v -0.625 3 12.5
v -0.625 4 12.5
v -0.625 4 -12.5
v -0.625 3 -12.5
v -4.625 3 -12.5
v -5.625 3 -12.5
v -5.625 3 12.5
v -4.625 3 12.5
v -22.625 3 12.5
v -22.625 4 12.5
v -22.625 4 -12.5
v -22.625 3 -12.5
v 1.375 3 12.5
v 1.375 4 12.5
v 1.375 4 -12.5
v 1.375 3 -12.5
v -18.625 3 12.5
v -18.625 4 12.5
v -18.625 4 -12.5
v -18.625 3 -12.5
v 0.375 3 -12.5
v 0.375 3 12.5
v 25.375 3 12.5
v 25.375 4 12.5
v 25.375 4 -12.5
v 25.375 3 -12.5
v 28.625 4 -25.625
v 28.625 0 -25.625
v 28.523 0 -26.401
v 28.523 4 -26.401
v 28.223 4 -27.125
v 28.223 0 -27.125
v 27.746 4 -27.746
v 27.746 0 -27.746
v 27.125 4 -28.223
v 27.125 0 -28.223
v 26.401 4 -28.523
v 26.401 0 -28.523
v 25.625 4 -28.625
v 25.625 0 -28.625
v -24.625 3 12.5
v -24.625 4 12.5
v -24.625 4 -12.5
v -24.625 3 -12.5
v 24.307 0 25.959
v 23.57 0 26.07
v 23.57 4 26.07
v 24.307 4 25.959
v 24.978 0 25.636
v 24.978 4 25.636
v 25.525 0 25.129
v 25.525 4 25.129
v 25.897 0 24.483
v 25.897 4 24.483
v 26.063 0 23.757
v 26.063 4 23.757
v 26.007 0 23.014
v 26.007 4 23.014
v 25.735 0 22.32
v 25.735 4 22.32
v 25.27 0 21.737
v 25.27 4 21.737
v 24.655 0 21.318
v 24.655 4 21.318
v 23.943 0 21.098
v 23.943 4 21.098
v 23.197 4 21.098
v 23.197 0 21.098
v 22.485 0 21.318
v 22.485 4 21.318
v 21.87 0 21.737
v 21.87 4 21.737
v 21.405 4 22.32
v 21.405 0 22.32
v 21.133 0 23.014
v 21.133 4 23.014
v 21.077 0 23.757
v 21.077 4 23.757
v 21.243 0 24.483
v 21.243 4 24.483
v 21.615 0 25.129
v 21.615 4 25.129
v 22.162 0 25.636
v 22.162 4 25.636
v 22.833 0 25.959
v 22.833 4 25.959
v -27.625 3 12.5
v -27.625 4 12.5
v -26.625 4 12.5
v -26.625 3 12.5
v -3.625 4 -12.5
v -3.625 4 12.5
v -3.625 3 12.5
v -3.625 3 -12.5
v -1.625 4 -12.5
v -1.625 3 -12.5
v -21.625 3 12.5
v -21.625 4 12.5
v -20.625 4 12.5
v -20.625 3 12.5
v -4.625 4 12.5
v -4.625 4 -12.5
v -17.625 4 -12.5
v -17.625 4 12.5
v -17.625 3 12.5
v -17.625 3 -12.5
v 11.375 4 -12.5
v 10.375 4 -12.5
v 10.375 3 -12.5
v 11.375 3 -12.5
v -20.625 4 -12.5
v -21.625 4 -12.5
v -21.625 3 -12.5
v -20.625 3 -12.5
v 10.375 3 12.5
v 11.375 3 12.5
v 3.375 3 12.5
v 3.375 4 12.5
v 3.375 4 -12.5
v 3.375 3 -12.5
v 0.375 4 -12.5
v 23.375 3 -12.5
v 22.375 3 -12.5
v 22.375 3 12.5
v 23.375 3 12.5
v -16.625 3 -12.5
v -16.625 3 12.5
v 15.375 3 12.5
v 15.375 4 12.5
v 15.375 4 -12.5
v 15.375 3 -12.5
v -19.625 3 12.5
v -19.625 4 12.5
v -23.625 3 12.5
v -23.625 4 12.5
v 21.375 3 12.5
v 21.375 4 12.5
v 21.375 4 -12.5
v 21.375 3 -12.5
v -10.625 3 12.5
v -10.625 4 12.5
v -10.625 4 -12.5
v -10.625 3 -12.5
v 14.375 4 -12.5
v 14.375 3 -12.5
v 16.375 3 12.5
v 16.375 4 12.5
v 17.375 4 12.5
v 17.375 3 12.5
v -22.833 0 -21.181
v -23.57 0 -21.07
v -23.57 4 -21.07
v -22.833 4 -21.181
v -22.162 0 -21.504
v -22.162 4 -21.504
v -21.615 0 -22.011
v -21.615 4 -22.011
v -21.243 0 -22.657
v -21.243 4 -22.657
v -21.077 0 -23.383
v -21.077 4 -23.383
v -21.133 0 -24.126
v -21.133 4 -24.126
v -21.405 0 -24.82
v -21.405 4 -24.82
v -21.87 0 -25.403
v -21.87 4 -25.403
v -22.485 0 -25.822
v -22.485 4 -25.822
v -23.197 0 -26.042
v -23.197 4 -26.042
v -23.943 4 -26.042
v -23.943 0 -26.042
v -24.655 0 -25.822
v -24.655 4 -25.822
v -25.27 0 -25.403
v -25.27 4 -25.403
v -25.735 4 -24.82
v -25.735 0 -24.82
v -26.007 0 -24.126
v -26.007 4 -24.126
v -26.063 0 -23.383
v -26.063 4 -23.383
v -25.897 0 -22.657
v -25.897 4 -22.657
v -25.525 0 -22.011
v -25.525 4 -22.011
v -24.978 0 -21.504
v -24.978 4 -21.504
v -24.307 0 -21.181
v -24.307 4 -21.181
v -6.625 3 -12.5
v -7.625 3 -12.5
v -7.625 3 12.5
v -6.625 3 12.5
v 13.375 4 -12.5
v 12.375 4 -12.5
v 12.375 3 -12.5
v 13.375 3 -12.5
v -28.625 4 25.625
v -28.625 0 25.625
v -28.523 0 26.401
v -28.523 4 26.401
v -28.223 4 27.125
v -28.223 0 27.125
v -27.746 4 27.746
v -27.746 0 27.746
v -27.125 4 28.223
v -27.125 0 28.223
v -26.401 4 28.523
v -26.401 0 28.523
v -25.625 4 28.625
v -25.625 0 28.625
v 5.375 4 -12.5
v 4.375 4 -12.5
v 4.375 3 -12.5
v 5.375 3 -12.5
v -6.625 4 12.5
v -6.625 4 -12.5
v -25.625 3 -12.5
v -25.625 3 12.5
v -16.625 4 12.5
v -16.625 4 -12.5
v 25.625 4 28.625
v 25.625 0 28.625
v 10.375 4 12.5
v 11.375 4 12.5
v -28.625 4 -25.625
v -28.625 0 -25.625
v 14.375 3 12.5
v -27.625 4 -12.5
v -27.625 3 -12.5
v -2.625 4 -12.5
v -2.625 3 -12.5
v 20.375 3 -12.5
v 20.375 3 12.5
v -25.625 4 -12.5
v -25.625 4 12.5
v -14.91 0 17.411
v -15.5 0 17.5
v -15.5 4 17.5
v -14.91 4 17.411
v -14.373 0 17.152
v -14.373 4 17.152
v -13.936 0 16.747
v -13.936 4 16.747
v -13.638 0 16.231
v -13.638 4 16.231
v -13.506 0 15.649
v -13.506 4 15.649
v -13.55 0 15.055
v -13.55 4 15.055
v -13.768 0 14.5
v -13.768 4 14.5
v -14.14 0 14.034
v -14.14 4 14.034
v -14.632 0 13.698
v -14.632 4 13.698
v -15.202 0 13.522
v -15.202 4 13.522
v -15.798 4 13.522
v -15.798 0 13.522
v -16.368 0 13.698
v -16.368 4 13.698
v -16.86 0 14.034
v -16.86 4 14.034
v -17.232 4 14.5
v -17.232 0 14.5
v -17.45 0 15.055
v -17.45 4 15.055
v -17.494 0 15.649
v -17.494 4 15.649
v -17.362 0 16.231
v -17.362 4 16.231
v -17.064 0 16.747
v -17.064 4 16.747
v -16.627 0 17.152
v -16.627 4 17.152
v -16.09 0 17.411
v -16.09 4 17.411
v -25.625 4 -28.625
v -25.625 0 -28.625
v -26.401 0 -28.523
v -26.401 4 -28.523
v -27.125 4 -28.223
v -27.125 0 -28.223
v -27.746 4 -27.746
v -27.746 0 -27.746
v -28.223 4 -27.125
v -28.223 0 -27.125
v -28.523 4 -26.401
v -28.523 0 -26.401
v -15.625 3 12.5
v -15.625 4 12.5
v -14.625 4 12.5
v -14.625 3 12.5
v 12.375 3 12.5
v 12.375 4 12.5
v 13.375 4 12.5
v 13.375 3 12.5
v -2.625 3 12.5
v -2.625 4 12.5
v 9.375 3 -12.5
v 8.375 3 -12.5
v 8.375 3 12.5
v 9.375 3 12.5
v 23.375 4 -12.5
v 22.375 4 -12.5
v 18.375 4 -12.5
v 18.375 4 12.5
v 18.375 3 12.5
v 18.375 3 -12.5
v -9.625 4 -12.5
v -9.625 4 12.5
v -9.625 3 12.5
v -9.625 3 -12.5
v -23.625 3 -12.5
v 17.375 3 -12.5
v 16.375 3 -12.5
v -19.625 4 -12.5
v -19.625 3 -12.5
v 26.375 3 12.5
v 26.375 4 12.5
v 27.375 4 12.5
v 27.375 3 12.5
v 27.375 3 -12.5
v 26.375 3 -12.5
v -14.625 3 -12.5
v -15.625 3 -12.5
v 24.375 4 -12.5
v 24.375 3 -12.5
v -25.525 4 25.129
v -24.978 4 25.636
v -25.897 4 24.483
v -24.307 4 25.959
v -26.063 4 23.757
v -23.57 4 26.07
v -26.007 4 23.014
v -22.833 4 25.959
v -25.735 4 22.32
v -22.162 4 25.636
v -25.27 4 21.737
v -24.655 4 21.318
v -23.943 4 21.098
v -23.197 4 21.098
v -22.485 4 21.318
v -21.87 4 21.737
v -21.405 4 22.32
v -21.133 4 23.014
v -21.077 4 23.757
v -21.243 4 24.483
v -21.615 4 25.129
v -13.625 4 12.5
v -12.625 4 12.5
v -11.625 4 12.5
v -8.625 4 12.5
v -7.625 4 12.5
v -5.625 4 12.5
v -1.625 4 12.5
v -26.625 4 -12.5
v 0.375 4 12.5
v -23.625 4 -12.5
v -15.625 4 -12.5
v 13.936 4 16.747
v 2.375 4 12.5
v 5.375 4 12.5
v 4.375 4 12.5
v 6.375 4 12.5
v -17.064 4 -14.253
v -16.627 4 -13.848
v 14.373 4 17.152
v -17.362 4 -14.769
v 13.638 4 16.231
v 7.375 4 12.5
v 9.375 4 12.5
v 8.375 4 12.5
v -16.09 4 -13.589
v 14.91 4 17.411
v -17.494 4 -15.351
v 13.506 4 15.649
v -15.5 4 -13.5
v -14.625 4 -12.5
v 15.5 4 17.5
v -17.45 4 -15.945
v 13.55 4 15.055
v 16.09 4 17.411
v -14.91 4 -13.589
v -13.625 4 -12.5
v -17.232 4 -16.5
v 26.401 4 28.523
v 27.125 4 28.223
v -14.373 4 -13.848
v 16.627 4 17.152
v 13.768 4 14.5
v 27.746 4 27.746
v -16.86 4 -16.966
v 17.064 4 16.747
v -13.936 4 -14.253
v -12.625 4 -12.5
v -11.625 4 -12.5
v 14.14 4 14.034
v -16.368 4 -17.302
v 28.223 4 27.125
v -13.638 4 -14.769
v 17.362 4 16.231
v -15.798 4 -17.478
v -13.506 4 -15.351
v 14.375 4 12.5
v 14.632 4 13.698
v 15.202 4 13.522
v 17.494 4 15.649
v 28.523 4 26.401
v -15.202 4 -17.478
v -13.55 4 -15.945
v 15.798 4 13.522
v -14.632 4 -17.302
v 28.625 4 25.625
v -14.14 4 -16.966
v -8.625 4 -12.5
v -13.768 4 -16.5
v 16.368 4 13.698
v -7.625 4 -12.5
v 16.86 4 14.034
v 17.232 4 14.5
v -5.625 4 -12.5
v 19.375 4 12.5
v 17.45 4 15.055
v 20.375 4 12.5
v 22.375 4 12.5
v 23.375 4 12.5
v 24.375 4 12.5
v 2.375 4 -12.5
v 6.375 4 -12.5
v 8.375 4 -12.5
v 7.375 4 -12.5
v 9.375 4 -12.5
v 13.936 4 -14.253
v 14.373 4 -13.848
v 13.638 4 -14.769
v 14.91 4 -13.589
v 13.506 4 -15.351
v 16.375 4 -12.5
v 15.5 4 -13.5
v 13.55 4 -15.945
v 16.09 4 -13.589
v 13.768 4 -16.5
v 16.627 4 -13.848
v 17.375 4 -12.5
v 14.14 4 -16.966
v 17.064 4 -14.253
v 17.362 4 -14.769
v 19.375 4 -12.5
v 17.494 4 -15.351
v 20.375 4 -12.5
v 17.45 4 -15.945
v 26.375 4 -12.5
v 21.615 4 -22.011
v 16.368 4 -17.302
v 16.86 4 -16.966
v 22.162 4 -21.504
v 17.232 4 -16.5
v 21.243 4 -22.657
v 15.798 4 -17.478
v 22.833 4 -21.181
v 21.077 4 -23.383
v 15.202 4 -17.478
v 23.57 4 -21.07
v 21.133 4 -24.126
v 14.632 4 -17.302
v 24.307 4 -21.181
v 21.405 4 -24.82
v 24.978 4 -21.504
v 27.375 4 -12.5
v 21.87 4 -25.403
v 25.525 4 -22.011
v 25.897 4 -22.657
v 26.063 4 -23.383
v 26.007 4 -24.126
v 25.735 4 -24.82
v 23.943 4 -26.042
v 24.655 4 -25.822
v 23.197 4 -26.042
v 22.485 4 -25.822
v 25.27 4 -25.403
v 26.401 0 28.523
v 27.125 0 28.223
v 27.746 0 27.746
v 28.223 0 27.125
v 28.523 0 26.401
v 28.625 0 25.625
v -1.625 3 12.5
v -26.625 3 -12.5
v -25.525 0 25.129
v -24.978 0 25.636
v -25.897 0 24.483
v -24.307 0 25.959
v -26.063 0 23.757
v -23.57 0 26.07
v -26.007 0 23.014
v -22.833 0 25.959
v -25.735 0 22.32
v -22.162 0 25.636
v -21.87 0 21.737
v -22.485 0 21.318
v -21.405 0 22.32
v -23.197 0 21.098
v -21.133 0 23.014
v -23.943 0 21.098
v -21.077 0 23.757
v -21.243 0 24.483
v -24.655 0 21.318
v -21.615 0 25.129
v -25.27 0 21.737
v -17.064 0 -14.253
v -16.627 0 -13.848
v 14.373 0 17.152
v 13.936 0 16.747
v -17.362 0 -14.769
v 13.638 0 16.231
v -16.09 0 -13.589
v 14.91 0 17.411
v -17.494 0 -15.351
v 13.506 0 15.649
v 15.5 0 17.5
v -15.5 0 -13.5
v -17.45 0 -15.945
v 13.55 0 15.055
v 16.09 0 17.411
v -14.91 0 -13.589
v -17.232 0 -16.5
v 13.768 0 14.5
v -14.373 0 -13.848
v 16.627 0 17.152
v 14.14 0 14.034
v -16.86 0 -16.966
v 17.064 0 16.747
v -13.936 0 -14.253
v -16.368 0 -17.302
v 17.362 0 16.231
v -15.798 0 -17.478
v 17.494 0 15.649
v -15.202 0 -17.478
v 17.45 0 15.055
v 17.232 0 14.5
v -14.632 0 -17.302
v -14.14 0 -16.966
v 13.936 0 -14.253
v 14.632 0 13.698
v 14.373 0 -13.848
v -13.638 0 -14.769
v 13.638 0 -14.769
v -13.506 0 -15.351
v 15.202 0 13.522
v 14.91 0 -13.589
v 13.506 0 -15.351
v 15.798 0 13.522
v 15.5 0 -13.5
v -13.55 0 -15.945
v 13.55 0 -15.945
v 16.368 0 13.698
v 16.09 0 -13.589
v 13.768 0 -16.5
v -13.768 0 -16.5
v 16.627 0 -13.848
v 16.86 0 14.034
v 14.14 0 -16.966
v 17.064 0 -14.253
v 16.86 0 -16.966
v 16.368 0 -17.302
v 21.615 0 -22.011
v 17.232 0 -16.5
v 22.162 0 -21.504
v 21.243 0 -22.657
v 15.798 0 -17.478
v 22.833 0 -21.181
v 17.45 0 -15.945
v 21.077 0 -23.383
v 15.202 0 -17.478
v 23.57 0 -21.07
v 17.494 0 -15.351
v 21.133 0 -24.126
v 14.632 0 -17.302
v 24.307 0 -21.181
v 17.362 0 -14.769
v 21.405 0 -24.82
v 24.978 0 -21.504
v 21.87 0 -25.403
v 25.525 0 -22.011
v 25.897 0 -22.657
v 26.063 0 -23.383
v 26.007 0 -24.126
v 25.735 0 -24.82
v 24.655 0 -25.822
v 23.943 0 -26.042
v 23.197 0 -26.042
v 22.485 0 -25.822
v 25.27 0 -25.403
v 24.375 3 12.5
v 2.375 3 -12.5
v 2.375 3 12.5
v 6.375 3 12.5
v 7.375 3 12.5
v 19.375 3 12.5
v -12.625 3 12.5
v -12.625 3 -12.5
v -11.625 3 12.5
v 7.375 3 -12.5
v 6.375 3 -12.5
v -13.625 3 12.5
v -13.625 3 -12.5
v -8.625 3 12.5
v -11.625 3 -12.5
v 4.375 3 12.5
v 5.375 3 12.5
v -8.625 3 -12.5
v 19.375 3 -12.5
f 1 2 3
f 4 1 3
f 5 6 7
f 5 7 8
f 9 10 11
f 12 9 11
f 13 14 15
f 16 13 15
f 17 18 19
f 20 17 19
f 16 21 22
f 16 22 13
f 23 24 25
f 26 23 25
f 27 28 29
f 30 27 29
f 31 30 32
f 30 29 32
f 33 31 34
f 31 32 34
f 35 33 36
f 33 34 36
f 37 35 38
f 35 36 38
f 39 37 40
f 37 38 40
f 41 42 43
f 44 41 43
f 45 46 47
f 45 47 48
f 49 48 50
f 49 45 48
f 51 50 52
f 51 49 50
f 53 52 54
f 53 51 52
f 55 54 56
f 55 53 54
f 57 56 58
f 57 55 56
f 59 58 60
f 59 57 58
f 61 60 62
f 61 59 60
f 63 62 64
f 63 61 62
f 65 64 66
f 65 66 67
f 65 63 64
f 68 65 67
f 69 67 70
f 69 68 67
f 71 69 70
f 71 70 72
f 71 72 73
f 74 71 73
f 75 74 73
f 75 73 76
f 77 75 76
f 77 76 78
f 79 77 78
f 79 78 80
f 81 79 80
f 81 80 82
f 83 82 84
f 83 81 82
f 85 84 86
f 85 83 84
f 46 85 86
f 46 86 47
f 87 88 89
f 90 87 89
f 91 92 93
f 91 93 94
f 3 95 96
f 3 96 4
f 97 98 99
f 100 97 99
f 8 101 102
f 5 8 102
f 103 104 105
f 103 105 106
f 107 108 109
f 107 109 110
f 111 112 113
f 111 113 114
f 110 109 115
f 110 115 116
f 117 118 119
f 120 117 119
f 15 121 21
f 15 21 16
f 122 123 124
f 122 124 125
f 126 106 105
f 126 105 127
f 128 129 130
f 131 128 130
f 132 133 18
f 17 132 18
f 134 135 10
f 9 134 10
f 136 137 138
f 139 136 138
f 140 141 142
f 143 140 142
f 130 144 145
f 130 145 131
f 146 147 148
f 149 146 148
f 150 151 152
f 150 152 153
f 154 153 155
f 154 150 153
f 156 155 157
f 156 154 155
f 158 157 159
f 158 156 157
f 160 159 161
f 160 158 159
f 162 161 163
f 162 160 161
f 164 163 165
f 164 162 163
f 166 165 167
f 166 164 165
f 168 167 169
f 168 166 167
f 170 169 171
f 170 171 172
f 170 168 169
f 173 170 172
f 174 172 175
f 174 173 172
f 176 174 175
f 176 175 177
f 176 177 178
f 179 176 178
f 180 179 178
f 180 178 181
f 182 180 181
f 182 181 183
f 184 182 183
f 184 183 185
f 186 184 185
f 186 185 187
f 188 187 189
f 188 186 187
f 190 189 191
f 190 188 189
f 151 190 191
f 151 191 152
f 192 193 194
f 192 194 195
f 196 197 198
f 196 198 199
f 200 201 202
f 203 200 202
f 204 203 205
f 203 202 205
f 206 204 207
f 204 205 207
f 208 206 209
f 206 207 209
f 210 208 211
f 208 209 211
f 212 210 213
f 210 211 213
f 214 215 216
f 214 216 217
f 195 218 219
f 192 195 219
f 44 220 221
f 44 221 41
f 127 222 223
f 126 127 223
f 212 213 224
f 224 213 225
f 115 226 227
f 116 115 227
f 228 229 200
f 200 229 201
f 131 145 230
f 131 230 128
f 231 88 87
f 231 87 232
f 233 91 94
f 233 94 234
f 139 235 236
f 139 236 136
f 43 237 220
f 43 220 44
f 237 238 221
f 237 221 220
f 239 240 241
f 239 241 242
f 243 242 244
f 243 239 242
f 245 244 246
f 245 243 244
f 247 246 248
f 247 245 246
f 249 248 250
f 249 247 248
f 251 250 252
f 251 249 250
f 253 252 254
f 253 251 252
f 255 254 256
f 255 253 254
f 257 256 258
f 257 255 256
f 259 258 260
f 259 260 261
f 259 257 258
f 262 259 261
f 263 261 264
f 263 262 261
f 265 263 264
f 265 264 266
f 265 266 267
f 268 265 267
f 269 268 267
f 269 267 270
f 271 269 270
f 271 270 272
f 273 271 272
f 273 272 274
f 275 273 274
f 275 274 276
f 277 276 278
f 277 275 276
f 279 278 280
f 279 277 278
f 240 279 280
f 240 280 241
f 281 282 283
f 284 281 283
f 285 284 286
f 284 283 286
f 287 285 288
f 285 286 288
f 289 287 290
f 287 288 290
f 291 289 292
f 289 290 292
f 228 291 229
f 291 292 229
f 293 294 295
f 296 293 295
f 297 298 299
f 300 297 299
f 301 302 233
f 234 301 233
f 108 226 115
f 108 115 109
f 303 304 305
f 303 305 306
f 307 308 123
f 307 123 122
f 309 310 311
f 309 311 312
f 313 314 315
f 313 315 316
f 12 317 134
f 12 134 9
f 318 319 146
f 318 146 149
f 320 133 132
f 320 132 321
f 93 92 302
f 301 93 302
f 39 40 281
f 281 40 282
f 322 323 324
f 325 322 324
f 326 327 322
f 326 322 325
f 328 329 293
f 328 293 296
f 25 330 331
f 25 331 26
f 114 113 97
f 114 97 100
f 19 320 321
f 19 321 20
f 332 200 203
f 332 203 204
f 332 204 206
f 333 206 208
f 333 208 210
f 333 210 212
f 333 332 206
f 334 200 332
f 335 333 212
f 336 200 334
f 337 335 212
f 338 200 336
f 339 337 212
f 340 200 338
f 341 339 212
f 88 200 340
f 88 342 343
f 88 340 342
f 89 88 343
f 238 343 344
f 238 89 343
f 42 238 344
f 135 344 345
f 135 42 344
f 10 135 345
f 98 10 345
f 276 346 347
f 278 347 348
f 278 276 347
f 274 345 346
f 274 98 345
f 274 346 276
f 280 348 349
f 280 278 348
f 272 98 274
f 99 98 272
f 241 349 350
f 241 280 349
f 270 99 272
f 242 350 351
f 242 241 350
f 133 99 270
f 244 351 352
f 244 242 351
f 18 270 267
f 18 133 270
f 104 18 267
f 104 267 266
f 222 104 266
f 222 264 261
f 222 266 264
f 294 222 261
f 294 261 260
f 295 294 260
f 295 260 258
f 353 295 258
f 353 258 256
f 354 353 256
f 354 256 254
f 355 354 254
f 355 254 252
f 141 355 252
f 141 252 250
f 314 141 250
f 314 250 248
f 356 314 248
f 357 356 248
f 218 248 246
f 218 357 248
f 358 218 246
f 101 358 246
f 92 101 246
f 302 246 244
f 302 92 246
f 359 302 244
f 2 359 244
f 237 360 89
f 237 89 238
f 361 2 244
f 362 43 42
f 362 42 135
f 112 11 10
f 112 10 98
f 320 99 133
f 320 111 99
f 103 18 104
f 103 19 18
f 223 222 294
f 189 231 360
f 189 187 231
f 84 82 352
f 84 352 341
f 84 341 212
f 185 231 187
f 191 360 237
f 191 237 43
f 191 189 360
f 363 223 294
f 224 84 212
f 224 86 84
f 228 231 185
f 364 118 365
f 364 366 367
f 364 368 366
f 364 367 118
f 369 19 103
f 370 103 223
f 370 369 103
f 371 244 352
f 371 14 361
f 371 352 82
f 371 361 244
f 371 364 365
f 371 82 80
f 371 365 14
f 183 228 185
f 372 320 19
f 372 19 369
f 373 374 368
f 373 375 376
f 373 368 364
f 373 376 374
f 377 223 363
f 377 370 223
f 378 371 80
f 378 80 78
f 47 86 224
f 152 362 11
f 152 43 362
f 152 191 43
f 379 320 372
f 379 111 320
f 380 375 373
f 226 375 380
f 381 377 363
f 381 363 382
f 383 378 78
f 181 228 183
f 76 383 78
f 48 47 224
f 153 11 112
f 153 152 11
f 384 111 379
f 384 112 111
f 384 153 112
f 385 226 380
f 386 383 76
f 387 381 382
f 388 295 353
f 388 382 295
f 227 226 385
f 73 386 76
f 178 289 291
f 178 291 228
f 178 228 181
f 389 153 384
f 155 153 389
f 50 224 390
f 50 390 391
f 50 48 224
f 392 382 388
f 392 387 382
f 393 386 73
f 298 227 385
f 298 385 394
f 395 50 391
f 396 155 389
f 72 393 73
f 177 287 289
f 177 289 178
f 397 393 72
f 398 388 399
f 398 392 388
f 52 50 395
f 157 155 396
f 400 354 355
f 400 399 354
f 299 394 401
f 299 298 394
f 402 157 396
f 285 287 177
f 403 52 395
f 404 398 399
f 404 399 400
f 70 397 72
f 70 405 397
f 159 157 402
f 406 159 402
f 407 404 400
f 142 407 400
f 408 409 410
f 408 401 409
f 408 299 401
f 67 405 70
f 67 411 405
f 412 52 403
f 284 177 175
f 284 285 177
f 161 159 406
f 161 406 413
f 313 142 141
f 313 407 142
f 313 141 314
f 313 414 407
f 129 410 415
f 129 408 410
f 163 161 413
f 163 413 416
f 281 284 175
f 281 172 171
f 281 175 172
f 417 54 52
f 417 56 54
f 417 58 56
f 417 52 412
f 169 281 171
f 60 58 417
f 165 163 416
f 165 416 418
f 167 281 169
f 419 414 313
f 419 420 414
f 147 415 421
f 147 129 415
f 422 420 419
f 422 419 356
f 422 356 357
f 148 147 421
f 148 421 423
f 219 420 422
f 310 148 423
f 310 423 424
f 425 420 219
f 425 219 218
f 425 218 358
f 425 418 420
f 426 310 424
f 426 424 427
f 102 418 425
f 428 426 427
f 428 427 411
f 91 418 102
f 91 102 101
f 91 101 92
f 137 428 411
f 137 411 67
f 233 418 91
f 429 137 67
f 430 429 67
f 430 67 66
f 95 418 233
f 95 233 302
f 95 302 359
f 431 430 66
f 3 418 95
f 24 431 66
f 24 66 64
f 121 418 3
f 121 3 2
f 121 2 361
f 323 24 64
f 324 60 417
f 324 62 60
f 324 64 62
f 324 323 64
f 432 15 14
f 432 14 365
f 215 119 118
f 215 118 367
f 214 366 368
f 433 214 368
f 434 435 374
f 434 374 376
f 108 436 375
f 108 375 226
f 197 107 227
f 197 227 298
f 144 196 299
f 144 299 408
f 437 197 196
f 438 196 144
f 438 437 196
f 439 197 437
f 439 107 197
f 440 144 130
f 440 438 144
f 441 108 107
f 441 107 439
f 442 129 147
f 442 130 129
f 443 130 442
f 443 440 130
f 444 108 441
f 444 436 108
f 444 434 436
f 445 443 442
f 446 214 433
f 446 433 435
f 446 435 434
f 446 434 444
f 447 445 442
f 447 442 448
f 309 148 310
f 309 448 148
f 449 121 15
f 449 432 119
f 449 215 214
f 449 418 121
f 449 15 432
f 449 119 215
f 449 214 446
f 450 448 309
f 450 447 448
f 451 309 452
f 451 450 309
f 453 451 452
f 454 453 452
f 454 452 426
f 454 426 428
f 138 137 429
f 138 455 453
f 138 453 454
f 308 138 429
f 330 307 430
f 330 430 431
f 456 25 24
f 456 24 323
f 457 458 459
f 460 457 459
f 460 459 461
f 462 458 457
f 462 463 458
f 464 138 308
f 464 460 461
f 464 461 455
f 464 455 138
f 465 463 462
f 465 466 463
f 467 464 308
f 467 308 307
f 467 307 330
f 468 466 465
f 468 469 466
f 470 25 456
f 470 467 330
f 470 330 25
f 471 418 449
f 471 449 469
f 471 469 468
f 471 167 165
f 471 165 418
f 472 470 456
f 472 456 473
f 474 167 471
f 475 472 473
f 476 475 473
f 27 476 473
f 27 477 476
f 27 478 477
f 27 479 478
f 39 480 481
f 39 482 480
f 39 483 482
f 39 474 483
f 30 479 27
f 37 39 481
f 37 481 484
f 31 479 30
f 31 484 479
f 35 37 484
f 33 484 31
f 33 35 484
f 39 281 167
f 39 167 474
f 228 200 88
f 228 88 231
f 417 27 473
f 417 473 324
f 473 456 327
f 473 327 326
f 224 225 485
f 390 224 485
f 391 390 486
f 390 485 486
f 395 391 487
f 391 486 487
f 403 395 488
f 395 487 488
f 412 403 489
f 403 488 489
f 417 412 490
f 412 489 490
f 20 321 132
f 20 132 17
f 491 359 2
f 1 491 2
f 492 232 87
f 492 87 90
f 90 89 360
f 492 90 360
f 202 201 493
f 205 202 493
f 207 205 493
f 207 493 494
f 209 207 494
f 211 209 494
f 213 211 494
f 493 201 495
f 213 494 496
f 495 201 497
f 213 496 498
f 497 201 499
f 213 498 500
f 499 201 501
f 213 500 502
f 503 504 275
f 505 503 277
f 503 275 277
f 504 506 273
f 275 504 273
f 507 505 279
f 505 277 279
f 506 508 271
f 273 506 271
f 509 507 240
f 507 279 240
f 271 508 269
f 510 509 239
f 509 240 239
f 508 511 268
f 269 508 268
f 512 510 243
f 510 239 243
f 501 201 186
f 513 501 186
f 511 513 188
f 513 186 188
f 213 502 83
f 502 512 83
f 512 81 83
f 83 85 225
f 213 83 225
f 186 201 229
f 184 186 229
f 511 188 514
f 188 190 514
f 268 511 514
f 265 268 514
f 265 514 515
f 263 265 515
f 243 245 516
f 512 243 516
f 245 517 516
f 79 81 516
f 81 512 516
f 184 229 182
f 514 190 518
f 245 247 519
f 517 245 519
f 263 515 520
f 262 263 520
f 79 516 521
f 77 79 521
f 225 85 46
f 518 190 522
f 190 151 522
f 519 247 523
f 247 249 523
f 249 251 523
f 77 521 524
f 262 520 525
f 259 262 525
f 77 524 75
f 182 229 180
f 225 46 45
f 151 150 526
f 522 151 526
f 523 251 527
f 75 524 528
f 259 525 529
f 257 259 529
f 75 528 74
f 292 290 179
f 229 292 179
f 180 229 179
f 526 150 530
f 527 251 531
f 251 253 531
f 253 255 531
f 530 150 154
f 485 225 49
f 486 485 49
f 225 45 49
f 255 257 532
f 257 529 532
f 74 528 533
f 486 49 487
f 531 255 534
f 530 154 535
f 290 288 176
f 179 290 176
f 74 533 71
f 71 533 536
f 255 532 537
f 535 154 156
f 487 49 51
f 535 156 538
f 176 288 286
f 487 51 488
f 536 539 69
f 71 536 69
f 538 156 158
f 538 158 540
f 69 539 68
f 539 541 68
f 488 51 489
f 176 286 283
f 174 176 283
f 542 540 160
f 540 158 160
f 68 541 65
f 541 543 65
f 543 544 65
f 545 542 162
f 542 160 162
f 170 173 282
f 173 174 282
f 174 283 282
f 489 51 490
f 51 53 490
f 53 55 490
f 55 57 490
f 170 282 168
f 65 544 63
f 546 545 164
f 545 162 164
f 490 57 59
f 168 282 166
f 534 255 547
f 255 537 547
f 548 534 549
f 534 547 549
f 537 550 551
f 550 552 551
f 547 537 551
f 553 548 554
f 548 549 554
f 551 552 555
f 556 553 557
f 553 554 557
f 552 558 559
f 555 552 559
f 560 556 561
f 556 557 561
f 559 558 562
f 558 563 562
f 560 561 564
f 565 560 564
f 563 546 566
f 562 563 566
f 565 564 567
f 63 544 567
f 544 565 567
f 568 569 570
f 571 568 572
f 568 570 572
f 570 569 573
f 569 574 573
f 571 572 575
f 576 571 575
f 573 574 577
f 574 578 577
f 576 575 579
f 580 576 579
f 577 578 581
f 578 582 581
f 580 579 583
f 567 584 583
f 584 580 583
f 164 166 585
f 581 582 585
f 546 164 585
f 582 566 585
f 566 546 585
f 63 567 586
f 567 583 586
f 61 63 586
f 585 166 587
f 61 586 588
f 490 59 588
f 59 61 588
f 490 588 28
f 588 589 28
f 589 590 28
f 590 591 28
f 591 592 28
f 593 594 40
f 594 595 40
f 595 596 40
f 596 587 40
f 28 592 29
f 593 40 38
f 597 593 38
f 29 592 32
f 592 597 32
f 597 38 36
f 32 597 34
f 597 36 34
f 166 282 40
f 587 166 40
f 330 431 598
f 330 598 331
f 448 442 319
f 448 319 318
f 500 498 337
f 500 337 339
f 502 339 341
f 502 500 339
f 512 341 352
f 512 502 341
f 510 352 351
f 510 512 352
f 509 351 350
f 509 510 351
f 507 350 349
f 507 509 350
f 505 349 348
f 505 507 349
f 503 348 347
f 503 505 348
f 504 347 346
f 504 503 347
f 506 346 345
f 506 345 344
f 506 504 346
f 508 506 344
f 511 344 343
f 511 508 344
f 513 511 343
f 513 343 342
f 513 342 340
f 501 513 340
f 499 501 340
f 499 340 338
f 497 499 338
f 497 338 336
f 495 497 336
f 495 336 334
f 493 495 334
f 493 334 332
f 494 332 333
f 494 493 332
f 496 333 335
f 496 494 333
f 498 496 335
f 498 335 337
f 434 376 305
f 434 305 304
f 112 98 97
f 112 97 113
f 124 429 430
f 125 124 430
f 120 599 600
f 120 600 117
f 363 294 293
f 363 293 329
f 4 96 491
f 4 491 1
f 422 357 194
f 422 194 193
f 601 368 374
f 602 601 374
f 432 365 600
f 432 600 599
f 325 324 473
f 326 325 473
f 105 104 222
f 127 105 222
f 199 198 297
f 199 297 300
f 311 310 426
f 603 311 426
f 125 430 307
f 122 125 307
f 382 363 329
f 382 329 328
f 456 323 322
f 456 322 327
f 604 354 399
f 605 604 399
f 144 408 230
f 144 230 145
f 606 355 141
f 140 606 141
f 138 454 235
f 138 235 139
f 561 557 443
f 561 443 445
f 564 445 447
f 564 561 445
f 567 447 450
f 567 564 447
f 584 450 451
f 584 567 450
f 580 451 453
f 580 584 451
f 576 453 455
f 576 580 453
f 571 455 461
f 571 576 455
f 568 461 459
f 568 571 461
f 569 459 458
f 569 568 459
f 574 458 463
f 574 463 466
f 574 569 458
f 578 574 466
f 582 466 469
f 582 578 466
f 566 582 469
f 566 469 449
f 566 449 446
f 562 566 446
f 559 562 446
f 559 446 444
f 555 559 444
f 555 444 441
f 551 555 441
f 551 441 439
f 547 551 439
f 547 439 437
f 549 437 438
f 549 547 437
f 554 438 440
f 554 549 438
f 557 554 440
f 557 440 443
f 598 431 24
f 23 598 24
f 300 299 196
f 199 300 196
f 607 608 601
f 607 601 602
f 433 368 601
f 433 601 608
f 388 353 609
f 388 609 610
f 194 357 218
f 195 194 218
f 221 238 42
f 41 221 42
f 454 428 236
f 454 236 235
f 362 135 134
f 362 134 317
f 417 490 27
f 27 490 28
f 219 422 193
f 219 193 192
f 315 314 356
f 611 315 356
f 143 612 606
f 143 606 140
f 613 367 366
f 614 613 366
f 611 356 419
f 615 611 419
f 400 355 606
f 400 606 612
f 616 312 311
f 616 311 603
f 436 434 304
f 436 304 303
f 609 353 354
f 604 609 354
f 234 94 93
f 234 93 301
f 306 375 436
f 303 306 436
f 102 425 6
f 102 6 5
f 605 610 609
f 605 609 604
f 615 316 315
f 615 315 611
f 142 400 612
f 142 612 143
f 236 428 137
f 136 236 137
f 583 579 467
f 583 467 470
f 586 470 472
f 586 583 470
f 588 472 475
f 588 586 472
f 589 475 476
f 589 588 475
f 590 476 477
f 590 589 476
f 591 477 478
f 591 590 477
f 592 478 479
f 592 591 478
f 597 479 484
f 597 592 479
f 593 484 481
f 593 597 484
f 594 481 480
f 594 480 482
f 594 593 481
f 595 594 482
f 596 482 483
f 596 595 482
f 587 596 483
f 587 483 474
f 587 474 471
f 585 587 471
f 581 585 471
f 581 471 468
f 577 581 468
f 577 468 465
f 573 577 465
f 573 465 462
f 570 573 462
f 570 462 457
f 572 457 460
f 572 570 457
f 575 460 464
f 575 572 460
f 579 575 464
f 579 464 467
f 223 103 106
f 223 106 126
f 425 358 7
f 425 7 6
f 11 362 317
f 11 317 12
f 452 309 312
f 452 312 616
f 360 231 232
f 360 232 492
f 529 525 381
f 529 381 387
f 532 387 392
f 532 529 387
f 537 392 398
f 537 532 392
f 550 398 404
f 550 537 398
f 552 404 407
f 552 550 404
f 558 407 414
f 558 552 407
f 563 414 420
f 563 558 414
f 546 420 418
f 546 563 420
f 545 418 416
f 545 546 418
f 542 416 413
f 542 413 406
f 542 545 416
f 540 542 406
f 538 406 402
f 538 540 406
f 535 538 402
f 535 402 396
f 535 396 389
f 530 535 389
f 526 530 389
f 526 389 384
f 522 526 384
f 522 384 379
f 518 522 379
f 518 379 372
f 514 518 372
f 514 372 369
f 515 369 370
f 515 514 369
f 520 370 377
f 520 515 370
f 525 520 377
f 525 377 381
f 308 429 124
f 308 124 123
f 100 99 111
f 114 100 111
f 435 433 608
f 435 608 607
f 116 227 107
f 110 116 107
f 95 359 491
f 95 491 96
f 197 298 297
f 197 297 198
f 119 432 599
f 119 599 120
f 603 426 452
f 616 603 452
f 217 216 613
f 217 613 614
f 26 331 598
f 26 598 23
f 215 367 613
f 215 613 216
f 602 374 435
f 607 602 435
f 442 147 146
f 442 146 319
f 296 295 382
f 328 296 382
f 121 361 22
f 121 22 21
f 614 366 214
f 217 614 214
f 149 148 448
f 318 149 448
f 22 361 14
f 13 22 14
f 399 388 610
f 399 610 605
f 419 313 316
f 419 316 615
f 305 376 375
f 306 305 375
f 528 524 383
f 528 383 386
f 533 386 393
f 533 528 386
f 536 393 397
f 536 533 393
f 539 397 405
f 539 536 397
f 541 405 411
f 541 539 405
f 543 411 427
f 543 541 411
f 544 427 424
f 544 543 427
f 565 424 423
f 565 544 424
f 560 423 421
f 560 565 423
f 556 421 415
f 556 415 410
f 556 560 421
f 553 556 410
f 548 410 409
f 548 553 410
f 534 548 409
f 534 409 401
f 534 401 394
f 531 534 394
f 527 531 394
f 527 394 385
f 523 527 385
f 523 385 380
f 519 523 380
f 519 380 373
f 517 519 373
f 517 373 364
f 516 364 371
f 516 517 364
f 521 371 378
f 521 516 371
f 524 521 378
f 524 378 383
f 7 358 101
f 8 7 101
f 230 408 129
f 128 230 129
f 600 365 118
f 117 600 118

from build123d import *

# Parameters (mm, degrees)
SKETCH1_R           = 2
SKETCH1_R_2         = 2.5
BOSS_EXTRUDE1_DEPTH = 4
SKETCH2_W           = 1
SKETCH2_H           = 25
CUT_EXTRUDE1_DEPTH  = 1


with BuildPart() as part:
    # Sketch1 → Boss-Extrude1 (new body)
    with BuildSketch(Plane(origin=(0, 0, 0), x_dir=(1, 0, 0), z_dir=(0, 1, 0))):
        with BuildLine():
            Line((25.625, 28.625), (-25.625, 28.625))
            ThreePointArc((-25.625, 28.625), (-27.746320344, 27.746320344), (-28.625, 25.625))
            Line((-28.625, 25.625), (-28.625, -25.625))
            ThreePointArc((-28.625, -25.625), (-27.746320344, -27.746320344), (-25.625, -28.625))
            Line((-25.625, -28.625), (25.625, -28.625))
            ThreePointArc((25.625, -28.625), (27.746320344, -27.746320344), (28.625, -25.625))
            Line((28.625, -25.625), (28.625, 25.625))
            ThreePointArc((28.625, 25.625), (27.746320344, 27.746320344), (25.625, 28.625))
        make_face()
        with Locations(Location((-15.5, 15.5, 0), (0, 0, 270))):
            Circle(SKETCH1_R, mode=Mode.SUBTRACT)
        with Locations(Location((-23.57, 23.57, 0), (0, 0, 270))):
            Circle(SKETCH1_R_2, mode=Mode.SUBTRACT)
        with Locations(Location((23.57, 23.57, 0), (0, 0, 270))):
            Circle(SKETCH1_R_2, mode=Mode.SUBTRACT)
        with Locations(Location((15.5, 15.5, 0), (0, 0, 270))):
            Circle(SKETCH1_R, mode=Mode.SUBTRACT)
        with Locations(Location((15.5, -15.5, 0), (0, 0, 270))):
            Circle(SKETCH1_R, mode=Mode.SUBTRACT)
        with Locations(Location((-15.5, -15.5, 0), (0, 0, 270))):
            Circle(SKETCH1_R, mode=Mode.SUBTRACT)
        with Locations(Location((-23.57, -23.57, 0), (0, 0, 270))):
            Circle(SKETCH1_R_2, mode=Mode.SUBTRACT)
        with Locations(Location((23.57, -23.57, 0), (0, 0, 270))):
            Circle(SKETCH1_R_2, mode=Mode.SUBTRACT)
    extrude(amount=BOSS_EXTRUDE1_DEPTH)

    # Sketch2 → Cut-Extrude1 (cut)
    with BuildSketch(Plane(origin=(0, 4, 0), x_dir=(1, 0, 0), z_dir=(0, 1, 0))):
        with Locations((-27.125, 0)):
            Rectangle(SKETCH2_W, SKETCH2_H)
        with Locations((-25.125, 0)):
            Rectangle(SKETCH2_W, SKETCH2_H)
        with Locations((-23.125, 0)):
            Rectangle(SKETCH2_W, SKETCH2_H)
        with Locations((-21.125, 0)):
            Rectangle(SKETCH2_W, SKETCH2_H)
        with Locations((-19.125, 0)):
            Rectangle(SKETCH2_W, SKETCH2_H)
        with Locations((-17.125, 0)):
            Rectangle(SKETCH2_W, SKETCH2_H)
        with Locations((-15.125, 0)):
            Rectangle(SKETCH2_W, SKETCH2_H)
        with Locations((-13.125, 0)):
            Rectangle(SKETCH2_W, SKETCH2_H)
        with Locations((-11.125, 0)):
            Rectangle(SKETCH2_W, SKETCH2_H)
        with Locations((-9.125, 0)):
            Rectangle(SKETCH2_W, SKETCH2_H)
        with Locations((-7.125, 0)):
            Rectangle(SKETCH2_W, SKETCH2_H)
        with Locations((-5.125, 0)):
            Rectangle(SKETCH2_W, SKETCH2_H)
        with Locations((-3.125, 0)):
            Rectangle(SKETCH2_W, SKETCH2_H)
        with Locations((-1.125, 0)):
            Rectangle(SKETCH2_W, SKETCH2_H)
        with Locations((0.875, 0)):
            Rectangle(SKETCH2_W, SKETCH2_H)
        with Locations((2.875, 0)):
            Rectangle(SKETCH2_W, SKETCH2_H)
        with Locations((4.875, 0)):
            Rectangle(SKETCH2_W, SKETCH2_H)
        with Locations((6.875, 0)):
            Rectangle(SKETCH2_W, SKETCH2_H)
        with Locations((8.875, 0)):
            Rectangle(SKETCH2_W, SKETCH2_H)
        with Locations((10.875, 0)):
            Rectangle(SKETCH2_W, SKETCH2_H)
        with Locations((12.875, 0)):
            Rectangle(SKETCH2_W, SKETCH2_H)
        with Locations((14.875, 0)):
            Rectangle(SKETCH2_W, SKETCH2_H)
        with Locations((16.875, 0)):
            Rectangle(SKETCH2_W, SKETCH2_H)
        with Locations((18.875, 0)):
            Rectangle(SKETCH2_W, SKETCH2_H)
        with Locations((20.875, 0)):
            Rectangle(SKETCH2_W, SKETCH2_H)
        with Locations((22.875, 0)):
            Rectangle(SKETCH2_W, SKETCH2_H)
        with Locations((24.875, 0)):
            Rectangle(SKETCH2_W, SKETCH2_H)
        with Locations((26.875, 0)):
            Rectangle(SKETCH2_W, SKETCH2_H)
    extrude(amount=-CUT_EXTRUDE1_DEPTH, mode=Mode.SUBTRACT)


solid = part.part
